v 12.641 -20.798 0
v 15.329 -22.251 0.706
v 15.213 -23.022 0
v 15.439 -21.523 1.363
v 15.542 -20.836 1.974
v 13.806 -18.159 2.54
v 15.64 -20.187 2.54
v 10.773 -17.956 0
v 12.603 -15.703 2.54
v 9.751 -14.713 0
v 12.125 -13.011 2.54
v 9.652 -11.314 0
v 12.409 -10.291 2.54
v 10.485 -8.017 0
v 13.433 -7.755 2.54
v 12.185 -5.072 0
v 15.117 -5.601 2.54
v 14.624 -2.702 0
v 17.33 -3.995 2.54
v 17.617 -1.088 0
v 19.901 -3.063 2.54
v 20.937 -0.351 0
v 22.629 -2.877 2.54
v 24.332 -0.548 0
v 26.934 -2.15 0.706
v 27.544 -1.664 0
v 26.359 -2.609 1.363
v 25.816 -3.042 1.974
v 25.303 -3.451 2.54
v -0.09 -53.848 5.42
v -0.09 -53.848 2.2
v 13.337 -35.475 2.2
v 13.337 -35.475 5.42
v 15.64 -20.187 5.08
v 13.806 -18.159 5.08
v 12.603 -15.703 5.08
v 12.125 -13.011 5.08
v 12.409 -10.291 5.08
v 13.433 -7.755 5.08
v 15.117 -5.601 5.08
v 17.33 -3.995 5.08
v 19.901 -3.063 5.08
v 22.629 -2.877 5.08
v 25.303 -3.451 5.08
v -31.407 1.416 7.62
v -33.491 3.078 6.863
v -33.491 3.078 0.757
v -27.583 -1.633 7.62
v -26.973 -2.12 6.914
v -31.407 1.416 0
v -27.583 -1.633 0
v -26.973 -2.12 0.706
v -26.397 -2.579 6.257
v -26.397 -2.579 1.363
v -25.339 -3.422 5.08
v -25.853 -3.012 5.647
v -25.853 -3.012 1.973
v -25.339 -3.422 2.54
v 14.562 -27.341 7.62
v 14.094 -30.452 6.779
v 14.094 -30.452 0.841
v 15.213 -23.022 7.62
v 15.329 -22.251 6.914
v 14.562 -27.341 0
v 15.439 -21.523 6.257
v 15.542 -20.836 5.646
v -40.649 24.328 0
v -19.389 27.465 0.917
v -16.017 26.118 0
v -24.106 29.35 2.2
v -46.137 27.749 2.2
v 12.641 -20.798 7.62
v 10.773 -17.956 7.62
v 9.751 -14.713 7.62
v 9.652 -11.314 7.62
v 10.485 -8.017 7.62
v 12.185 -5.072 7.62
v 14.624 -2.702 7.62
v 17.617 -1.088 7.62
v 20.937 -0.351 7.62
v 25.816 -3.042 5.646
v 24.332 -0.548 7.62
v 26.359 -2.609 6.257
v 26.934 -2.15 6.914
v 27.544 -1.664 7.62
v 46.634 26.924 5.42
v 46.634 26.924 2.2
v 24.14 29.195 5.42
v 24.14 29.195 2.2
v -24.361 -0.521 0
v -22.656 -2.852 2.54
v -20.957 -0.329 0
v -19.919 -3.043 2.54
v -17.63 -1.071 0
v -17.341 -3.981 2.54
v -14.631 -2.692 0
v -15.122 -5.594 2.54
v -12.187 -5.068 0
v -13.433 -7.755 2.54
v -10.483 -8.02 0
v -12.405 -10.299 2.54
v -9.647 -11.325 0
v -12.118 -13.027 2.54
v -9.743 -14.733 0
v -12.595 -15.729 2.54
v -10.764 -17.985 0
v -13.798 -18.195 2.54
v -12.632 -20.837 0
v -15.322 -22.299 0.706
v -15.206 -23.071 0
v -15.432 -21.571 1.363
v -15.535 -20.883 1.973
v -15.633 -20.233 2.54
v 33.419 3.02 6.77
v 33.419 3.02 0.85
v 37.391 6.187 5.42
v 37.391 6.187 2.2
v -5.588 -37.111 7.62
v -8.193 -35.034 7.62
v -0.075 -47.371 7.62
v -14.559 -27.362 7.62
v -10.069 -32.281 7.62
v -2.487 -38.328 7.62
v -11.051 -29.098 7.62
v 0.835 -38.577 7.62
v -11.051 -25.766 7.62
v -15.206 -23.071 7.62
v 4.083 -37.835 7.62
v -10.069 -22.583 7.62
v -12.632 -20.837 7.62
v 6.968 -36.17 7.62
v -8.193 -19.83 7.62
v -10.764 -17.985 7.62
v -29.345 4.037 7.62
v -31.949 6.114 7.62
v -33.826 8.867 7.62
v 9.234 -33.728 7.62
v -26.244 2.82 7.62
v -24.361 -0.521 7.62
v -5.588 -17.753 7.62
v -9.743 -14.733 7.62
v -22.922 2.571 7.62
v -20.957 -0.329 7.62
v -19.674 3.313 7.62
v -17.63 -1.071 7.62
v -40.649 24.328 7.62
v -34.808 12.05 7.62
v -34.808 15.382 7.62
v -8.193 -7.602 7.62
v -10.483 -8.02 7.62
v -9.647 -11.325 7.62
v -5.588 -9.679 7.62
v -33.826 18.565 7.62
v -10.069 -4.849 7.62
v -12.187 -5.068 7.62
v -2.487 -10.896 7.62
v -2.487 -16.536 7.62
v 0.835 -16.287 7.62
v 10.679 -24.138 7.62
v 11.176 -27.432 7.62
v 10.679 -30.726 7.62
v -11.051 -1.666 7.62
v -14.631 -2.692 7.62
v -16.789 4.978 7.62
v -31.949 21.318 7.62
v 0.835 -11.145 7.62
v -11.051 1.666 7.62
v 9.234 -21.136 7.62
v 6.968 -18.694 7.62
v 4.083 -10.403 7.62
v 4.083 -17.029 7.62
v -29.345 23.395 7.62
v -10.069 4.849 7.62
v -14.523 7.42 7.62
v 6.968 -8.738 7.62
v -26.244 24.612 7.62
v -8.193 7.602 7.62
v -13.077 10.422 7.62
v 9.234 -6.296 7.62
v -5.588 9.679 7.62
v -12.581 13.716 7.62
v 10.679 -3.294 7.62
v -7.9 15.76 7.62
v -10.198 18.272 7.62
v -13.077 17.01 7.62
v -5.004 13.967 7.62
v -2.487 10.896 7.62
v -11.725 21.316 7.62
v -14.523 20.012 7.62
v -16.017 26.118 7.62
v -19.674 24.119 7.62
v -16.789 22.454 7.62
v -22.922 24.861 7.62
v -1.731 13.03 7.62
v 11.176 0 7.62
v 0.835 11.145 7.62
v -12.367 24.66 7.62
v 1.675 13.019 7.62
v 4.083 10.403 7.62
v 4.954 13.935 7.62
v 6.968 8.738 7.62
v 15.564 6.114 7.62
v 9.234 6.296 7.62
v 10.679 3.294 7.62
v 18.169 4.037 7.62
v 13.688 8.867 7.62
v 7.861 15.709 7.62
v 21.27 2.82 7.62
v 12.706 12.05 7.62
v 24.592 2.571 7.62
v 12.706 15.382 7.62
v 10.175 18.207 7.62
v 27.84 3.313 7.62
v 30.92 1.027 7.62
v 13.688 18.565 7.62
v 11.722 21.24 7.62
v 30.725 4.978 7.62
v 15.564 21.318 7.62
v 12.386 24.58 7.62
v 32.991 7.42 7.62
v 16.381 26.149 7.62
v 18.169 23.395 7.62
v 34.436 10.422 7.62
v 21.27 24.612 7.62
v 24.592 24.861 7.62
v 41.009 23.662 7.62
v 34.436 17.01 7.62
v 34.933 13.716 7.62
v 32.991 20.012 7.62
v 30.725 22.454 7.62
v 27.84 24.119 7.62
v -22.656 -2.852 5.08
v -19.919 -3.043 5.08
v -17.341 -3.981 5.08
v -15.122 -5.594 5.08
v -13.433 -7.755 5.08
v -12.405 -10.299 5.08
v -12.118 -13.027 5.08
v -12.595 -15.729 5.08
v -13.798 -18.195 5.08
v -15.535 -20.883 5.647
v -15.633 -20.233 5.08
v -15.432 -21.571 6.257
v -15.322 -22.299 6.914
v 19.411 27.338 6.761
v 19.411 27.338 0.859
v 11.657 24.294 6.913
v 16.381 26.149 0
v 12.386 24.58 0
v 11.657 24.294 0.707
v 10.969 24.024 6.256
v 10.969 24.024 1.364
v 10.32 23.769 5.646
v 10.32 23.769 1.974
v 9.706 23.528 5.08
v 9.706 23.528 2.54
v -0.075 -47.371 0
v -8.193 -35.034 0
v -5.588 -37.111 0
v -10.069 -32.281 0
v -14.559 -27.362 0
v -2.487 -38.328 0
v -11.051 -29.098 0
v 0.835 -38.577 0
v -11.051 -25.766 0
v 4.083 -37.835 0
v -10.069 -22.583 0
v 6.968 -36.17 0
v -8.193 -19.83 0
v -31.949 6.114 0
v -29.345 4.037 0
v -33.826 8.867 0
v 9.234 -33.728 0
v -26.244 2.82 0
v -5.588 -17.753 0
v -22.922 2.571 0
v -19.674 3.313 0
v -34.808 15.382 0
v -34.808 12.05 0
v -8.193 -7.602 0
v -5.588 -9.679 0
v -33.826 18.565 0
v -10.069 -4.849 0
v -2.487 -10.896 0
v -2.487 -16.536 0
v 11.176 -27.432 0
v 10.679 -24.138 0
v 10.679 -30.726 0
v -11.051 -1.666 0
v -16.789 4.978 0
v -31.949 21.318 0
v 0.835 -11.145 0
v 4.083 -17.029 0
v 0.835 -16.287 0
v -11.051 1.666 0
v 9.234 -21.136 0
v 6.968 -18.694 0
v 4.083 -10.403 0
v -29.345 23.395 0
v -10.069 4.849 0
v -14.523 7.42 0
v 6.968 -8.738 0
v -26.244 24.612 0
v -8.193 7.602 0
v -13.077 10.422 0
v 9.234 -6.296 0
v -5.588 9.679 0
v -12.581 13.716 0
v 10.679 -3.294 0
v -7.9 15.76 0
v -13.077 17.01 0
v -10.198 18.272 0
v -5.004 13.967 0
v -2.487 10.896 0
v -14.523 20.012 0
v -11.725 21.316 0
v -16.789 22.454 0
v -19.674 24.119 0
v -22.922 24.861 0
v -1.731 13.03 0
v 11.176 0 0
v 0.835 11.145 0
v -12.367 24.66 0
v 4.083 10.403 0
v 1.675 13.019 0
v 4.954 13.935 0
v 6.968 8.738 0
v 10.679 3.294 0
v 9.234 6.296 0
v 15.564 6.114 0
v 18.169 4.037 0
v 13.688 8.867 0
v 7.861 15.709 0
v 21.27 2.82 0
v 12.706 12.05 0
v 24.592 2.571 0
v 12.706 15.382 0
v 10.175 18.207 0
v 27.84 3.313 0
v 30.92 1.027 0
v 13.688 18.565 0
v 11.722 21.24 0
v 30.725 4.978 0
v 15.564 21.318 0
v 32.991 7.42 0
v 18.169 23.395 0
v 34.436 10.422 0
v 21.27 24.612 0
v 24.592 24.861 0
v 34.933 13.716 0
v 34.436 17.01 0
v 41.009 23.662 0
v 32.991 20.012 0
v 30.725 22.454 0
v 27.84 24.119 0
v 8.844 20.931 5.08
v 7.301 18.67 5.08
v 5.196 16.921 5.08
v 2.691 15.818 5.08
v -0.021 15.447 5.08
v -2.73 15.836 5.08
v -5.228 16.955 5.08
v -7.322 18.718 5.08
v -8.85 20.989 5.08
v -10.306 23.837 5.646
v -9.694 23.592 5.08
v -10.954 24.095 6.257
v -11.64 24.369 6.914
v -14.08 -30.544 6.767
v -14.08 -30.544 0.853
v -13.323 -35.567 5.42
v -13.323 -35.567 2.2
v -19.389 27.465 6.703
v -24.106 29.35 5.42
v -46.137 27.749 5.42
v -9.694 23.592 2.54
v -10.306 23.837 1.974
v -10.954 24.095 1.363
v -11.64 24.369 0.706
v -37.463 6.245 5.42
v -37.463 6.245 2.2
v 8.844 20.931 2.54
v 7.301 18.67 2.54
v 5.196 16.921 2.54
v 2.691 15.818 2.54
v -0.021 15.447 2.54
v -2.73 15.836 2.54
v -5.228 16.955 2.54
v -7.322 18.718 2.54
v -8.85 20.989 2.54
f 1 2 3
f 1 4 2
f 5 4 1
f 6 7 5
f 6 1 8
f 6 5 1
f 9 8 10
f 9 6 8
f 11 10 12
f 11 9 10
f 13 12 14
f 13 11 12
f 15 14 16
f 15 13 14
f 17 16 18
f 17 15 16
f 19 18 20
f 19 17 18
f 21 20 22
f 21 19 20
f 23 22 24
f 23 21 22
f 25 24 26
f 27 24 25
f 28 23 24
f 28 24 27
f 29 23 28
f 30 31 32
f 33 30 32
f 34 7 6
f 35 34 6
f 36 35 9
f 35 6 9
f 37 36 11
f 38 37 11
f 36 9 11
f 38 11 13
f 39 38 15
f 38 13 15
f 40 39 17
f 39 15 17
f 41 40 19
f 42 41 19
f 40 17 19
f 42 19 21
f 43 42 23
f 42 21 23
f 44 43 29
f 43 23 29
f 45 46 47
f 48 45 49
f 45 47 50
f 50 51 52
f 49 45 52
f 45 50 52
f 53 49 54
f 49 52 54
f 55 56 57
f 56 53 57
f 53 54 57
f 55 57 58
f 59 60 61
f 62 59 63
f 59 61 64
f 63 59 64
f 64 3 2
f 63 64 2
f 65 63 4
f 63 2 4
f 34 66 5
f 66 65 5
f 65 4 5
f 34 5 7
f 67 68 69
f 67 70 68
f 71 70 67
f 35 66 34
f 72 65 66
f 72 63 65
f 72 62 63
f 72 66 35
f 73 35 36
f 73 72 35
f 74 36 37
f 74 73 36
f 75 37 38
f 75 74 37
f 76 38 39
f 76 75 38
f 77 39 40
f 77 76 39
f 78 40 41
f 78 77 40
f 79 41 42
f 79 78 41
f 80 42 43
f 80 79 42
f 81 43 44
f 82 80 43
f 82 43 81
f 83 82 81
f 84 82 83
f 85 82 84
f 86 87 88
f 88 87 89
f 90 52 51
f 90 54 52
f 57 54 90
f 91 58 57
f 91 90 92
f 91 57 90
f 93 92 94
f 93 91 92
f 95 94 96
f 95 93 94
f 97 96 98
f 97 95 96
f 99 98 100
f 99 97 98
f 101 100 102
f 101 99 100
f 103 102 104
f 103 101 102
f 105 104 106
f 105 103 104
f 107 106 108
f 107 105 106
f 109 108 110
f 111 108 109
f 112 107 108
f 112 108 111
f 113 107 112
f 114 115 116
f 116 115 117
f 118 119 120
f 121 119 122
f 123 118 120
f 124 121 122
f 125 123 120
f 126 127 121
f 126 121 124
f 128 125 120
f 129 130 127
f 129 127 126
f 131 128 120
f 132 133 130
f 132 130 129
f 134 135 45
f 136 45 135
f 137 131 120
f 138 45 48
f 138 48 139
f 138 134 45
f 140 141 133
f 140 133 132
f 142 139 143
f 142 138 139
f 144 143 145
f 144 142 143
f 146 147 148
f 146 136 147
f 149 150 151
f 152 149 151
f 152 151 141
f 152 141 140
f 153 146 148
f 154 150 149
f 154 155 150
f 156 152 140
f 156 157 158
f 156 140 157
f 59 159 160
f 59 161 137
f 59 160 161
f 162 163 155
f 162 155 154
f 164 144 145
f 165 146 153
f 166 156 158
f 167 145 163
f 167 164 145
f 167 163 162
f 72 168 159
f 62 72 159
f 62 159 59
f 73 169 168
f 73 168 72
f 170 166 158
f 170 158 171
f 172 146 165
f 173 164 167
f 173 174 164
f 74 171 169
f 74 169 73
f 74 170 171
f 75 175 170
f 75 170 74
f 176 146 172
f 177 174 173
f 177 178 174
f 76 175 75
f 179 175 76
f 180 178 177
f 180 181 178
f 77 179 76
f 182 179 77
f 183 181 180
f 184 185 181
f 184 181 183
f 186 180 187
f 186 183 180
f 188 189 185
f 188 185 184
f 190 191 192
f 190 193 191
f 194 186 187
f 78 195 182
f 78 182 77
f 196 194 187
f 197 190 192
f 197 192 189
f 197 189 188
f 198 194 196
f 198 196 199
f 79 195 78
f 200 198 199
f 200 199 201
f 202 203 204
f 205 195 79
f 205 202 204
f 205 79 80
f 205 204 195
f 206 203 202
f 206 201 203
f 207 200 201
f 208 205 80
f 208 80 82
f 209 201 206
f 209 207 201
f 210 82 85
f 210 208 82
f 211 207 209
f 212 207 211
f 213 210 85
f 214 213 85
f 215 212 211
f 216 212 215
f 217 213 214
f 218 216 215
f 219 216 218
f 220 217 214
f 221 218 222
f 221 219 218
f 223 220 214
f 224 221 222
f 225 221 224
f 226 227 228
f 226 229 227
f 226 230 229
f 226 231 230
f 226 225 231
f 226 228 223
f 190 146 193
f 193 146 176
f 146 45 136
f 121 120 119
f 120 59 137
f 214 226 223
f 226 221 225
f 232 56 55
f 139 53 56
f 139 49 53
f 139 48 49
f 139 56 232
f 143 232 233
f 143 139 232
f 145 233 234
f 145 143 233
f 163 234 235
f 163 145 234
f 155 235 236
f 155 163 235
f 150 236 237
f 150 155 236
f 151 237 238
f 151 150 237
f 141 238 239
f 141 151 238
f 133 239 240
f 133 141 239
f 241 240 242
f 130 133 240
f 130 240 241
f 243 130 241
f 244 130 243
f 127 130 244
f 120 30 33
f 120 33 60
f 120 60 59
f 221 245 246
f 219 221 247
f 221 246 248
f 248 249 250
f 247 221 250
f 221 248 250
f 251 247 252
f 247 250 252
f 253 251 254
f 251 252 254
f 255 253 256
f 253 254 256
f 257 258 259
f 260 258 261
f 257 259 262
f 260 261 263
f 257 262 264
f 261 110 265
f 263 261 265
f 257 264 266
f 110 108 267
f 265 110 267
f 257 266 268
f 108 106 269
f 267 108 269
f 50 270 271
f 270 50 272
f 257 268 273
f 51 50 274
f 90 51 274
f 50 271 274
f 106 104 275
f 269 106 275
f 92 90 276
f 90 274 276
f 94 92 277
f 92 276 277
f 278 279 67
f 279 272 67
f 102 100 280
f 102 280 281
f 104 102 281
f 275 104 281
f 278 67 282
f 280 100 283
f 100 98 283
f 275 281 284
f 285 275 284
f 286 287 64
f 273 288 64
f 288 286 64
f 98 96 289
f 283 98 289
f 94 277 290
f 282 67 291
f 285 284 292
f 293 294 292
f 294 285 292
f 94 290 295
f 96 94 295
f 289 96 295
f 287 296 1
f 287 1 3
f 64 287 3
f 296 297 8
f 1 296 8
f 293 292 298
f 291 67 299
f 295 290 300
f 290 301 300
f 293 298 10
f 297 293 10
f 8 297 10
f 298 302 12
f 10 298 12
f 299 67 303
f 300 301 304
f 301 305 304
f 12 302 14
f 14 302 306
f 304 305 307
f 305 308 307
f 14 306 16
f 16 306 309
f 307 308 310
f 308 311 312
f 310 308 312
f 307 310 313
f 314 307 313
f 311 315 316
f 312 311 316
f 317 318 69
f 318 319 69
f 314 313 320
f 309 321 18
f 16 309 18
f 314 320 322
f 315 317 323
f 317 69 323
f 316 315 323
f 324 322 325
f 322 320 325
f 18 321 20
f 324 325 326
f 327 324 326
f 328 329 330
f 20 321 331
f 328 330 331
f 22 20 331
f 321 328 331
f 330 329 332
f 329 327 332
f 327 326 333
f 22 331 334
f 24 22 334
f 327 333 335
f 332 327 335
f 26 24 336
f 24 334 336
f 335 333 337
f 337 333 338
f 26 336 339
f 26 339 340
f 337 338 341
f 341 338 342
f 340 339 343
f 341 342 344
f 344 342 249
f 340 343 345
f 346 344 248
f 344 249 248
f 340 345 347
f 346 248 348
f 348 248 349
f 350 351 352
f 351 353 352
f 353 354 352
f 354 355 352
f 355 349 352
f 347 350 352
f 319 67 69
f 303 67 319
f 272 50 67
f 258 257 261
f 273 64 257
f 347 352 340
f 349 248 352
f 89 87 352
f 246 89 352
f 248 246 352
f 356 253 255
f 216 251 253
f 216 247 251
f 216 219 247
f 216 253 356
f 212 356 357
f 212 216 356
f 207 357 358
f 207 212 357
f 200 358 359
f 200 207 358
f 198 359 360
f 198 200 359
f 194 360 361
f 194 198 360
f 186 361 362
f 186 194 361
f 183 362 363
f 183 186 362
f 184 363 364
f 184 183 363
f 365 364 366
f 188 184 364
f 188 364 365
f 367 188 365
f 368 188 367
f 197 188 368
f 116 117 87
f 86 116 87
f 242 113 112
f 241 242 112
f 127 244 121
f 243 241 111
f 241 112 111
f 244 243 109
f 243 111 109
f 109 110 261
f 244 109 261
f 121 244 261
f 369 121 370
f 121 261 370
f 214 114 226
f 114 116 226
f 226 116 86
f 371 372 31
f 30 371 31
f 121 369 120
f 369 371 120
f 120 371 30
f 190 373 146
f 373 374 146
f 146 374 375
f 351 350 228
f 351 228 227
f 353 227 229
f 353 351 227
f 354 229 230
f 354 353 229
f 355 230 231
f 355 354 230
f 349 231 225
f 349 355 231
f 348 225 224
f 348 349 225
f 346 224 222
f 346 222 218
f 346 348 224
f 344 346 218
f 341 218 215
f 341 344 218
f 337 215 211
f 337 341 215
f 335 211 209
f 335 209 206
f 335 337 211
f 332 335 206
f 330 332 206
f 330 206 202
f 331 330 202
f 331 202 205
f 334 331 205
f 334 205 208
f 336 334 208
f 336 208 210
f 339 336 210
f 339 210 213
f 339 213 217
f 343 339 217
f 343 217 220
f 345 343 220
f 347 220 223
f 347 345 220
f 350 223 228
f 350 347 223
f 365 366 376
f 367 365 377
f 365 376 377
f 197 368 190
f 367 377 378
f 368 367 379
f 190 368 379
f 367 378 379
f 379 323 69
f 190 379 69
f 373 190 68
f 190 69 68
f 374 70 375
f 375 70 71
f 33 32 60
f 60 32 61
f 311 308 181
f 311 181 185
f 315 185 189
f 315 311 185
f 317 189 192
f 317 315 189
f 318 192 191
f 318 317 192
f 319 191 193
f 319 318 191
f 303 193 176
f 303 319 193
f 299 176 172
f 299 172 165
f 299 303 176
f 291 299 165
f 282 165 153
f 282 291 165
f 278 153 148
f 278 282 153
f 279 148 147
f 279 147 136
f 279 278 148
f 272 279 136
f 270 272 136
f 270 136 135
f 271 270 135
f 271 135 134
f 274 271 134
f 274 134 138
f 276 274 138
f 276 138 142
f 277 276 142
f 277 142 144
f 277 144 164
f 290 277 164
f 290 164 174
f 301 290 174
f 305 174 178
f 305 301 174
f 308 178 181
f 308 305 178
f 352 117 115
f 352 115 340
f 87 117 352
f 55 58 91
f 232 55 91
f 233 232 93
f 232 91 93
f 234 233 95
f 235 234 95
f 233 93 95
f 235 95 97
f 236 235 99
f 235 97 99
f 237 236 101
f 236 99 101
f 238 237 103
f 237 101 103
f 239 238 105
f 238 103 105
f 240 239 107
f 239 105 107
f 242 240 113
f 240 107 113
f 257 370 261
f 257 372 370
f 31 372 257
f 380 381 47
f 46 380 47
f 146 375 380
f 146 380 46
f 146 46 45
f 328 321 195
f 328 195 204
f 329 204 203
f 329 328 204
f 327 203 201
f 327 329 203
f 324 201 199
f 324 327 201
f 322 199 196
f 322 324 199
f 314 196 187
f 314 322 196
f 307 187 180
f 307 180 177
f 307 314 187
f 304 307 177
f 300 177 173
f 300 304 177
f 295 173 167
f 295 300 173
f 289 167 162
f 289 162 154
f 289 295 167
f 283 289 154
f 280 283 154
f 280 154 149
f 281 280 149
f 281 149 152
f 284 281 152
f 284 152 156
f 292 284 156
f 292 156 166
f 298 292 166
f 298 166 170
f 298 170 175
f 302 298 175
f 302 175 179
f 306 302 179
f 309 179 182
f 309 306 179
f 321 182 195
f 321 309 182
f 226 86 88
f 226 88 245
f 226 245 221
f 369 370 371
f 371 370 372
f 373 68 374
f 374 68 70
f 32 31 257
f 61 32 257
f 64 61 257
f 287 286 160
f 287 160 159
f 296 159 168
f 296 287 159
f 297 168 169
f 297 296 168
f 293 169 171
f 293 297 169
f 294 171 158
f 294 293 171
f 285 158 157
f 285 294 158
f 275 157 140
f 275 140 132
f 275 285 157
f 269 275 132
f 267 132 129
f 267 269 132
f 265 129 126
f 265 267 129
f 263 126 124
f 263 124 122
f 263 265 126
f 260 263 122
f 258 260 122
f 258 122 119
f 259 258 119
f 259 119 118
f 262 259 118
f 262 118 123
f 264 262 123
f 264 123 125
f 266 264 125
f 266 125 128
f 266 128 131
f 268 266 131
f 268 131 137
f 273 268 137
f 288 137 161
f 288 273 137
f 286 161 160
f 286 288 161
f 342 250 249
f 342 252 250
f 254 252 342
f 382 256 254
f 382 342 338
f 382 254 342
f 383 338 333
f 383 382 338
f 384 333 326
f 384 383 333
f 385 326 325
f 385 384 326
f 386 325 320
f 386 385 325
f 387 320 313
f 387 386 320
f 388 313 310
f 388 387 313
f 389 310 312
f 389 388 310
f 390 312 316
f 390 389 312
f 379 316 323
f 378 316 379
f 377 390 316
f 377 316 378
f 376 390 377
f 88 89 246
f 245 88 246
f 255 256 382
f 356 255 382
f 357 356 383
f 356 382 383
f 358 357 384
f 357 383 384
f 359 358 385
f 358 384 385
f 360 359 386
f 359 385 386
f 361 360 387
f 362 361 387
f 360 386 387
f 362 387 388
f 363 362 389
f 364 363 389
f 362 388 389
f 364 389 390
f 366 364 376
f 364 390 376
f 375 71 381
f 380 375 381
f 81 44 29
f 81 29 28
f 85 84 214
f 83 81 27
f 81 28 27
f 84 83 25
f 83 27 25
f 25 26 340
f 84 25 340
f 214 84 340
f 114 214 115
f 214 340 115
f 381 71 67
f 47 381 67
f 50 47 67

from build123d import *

# Parameters (mm, degrees)
F0_R       = 11.176
F1_DEPTH   = 7.62
F2_SIZE2   = 2.1997045256
F2_SIZE    = 3.81
F2_2_SIZE2 = 2.1997045256
F2_2_SIZE  = 3.81
F3_SIZE2   = 2.1997045256
F3_SIZE    = 3.81
F4_SIZE    = 2.54


# Not quite as in the source:
# - a feature names something its author has since deleted; it is built from what else it names


with BuildPart() as f1:
    # F0 (on Top) → F1 (new body)
    with BuildSketch(Plane.XY):
        with BuildLine():
            ThreePointArc((9.7057271537, 23.5283748909), (-0.0208649872, 15.4470615517), (-9.6943160077, 23.5919105566))
            Line((-9.6943160077, 23.5919105566), (-19.3886320155, 27.4654462223))
            Line((-19.3886320155, 27.4654462223), (-24.1059964708, 29.3503527439))
            Line((-24.1059964708, 29.3503527439), (-46.1373193312, 27.748740566))
            Line((-46.1373193312, 27.748740566), (-37.463364806, 6.2451757293))
            Line((-37.463364806, 6.2451757293), (-33.4914395336, 3.0781251091))
            Line((-33.4914395336, 3.0781251091), (-25.3390191684, -3.4222811682))
            ThreePointArc((-25.3390191684, -3.4222811682), (-13.4326493579, -7.7553437227), (-15.6332920147, -20.2330937227))
            Line((-15.6332920147, -20.2330937227), (-14.0799852263, -30.5435))
            Line((-14.0799852263, -30.5435), (-13.3232015704, -35.5668134979))
            Line((-13.3232015704, -35.5668134979), (-0.0898891733, -53.8478470607))
            Line((-0.0898891733, -53.8478470607), (13.3370282377, -35.4750360336))
            Line((13.3370282377, -35.4750360336), (14.0938118937, -30.4517225357))
            Line((14.0938118937, -30.4517225357), (15.6402053484, -20.1872049906))
            ThreePointArc((15.6402053484, -20.1872049906), (13.4326493579, -7.7553437227), (25.3027350274, -3.4512126568))
            Line((25.3027350274, -3.4512126568), (33.4188712518, 3.0202621318))
            Line((33.4188712518, 3.0202621318), (37.3907965242, 6.1873127519))
            Line((37.3907965242, 6.1873127519), (46.633735943, 26.924))
            Line((46.633735943, 26.924), (24.1401632357, 29.1946377686))
            Line((24.1401632357, 29.1946377686), (19.4114543073, 27.3383748909))
            Line((19.4114543073, 27.3383748909), (9.7057271537, 23.5283748909))
        make_face()
        with Locations((0, -27.432)):
            Circle(F0_R, mode=Mode.SUBTRACT)
        Circle(F0_R, mode=Mode.SUBTRACT)
        with Locations((-23.7568088766, 13.716)):
            Circle(F0_R, mode=Mode.SUBTRACT)
        with Locations((23.7568088766, 13.716)):
            Circle(F0_R, mode=Mode.SUBTRACT)
    extrude(amount=F1_DEPTH)

    # F2
    f2_edges = [f1.edges().sort_by_distance(p)[0] for p in [
        (-41.800342, 16.996958, 7.62),
        (-35.121658, 28.549547, 7.62),
        (35.38695, 28.059319, 7.62),
        (42.012266, 16.555656, 7.62),
        (6.62357, -44.661442, 7.62),
        (-6.706545, -44.70733, 7.62),
    ]]
    f2_side = f1.faces().sort_by_distance((13.256392, -27.645481, 7.62))[0]
    chamfer(f2_edges, length=F2_SIZE, length2=F2_SIZE2, reference=f2_side)

    # F2#2
    f2_2_edges = [f1.edges().sort_by_distance(p)[0] for p in [
        (-41.800342, 16.996958, 0),
        (42.012266, 16.555656, 0),
        (-35.121658, 28.549547, 0),
    ]]
    f2_2_side = f1.faces().sort_by_distance((12.353469, -7.132279, 0))[0]
    chamfer(f2_2_edges, length=F2_2_SIZE, length2=F2_2_SIZE2, reference=f2_2_side)

    # F3
    f3_edges = [f1.edges().sort_by_distance(p)[0] for p in [
        (-6.706545, -44.70733, 0),
        (6.62357, -44.661442, 0),
        (33.391083, 28.260794, 0),
    ]]
    f3_side = f1.faces().sort_by_distance((27.377875, -0.292303, 0))[0]
    chamfer(f3_edges, length=F3_SIZE, length2=F3_SIZE2, reference=f3_side)

    # F4
    f4_edges = [f1.edges().sort_by_distance(p)[0] for p in [
        (-0.020865, 15.447062, 7.62),
        (13.432649, -7.755344, 7.62),
        (-13.432649, -7.755344, 7.62),
        (-13.432649, -7.755344, 0),
        (-0.020865, 15.447062, 0),
        (13.432649, -7.755344, 0),
    ]]
    chamfer(f4_edges, length=F4_SIZE)


solid = f1.part
